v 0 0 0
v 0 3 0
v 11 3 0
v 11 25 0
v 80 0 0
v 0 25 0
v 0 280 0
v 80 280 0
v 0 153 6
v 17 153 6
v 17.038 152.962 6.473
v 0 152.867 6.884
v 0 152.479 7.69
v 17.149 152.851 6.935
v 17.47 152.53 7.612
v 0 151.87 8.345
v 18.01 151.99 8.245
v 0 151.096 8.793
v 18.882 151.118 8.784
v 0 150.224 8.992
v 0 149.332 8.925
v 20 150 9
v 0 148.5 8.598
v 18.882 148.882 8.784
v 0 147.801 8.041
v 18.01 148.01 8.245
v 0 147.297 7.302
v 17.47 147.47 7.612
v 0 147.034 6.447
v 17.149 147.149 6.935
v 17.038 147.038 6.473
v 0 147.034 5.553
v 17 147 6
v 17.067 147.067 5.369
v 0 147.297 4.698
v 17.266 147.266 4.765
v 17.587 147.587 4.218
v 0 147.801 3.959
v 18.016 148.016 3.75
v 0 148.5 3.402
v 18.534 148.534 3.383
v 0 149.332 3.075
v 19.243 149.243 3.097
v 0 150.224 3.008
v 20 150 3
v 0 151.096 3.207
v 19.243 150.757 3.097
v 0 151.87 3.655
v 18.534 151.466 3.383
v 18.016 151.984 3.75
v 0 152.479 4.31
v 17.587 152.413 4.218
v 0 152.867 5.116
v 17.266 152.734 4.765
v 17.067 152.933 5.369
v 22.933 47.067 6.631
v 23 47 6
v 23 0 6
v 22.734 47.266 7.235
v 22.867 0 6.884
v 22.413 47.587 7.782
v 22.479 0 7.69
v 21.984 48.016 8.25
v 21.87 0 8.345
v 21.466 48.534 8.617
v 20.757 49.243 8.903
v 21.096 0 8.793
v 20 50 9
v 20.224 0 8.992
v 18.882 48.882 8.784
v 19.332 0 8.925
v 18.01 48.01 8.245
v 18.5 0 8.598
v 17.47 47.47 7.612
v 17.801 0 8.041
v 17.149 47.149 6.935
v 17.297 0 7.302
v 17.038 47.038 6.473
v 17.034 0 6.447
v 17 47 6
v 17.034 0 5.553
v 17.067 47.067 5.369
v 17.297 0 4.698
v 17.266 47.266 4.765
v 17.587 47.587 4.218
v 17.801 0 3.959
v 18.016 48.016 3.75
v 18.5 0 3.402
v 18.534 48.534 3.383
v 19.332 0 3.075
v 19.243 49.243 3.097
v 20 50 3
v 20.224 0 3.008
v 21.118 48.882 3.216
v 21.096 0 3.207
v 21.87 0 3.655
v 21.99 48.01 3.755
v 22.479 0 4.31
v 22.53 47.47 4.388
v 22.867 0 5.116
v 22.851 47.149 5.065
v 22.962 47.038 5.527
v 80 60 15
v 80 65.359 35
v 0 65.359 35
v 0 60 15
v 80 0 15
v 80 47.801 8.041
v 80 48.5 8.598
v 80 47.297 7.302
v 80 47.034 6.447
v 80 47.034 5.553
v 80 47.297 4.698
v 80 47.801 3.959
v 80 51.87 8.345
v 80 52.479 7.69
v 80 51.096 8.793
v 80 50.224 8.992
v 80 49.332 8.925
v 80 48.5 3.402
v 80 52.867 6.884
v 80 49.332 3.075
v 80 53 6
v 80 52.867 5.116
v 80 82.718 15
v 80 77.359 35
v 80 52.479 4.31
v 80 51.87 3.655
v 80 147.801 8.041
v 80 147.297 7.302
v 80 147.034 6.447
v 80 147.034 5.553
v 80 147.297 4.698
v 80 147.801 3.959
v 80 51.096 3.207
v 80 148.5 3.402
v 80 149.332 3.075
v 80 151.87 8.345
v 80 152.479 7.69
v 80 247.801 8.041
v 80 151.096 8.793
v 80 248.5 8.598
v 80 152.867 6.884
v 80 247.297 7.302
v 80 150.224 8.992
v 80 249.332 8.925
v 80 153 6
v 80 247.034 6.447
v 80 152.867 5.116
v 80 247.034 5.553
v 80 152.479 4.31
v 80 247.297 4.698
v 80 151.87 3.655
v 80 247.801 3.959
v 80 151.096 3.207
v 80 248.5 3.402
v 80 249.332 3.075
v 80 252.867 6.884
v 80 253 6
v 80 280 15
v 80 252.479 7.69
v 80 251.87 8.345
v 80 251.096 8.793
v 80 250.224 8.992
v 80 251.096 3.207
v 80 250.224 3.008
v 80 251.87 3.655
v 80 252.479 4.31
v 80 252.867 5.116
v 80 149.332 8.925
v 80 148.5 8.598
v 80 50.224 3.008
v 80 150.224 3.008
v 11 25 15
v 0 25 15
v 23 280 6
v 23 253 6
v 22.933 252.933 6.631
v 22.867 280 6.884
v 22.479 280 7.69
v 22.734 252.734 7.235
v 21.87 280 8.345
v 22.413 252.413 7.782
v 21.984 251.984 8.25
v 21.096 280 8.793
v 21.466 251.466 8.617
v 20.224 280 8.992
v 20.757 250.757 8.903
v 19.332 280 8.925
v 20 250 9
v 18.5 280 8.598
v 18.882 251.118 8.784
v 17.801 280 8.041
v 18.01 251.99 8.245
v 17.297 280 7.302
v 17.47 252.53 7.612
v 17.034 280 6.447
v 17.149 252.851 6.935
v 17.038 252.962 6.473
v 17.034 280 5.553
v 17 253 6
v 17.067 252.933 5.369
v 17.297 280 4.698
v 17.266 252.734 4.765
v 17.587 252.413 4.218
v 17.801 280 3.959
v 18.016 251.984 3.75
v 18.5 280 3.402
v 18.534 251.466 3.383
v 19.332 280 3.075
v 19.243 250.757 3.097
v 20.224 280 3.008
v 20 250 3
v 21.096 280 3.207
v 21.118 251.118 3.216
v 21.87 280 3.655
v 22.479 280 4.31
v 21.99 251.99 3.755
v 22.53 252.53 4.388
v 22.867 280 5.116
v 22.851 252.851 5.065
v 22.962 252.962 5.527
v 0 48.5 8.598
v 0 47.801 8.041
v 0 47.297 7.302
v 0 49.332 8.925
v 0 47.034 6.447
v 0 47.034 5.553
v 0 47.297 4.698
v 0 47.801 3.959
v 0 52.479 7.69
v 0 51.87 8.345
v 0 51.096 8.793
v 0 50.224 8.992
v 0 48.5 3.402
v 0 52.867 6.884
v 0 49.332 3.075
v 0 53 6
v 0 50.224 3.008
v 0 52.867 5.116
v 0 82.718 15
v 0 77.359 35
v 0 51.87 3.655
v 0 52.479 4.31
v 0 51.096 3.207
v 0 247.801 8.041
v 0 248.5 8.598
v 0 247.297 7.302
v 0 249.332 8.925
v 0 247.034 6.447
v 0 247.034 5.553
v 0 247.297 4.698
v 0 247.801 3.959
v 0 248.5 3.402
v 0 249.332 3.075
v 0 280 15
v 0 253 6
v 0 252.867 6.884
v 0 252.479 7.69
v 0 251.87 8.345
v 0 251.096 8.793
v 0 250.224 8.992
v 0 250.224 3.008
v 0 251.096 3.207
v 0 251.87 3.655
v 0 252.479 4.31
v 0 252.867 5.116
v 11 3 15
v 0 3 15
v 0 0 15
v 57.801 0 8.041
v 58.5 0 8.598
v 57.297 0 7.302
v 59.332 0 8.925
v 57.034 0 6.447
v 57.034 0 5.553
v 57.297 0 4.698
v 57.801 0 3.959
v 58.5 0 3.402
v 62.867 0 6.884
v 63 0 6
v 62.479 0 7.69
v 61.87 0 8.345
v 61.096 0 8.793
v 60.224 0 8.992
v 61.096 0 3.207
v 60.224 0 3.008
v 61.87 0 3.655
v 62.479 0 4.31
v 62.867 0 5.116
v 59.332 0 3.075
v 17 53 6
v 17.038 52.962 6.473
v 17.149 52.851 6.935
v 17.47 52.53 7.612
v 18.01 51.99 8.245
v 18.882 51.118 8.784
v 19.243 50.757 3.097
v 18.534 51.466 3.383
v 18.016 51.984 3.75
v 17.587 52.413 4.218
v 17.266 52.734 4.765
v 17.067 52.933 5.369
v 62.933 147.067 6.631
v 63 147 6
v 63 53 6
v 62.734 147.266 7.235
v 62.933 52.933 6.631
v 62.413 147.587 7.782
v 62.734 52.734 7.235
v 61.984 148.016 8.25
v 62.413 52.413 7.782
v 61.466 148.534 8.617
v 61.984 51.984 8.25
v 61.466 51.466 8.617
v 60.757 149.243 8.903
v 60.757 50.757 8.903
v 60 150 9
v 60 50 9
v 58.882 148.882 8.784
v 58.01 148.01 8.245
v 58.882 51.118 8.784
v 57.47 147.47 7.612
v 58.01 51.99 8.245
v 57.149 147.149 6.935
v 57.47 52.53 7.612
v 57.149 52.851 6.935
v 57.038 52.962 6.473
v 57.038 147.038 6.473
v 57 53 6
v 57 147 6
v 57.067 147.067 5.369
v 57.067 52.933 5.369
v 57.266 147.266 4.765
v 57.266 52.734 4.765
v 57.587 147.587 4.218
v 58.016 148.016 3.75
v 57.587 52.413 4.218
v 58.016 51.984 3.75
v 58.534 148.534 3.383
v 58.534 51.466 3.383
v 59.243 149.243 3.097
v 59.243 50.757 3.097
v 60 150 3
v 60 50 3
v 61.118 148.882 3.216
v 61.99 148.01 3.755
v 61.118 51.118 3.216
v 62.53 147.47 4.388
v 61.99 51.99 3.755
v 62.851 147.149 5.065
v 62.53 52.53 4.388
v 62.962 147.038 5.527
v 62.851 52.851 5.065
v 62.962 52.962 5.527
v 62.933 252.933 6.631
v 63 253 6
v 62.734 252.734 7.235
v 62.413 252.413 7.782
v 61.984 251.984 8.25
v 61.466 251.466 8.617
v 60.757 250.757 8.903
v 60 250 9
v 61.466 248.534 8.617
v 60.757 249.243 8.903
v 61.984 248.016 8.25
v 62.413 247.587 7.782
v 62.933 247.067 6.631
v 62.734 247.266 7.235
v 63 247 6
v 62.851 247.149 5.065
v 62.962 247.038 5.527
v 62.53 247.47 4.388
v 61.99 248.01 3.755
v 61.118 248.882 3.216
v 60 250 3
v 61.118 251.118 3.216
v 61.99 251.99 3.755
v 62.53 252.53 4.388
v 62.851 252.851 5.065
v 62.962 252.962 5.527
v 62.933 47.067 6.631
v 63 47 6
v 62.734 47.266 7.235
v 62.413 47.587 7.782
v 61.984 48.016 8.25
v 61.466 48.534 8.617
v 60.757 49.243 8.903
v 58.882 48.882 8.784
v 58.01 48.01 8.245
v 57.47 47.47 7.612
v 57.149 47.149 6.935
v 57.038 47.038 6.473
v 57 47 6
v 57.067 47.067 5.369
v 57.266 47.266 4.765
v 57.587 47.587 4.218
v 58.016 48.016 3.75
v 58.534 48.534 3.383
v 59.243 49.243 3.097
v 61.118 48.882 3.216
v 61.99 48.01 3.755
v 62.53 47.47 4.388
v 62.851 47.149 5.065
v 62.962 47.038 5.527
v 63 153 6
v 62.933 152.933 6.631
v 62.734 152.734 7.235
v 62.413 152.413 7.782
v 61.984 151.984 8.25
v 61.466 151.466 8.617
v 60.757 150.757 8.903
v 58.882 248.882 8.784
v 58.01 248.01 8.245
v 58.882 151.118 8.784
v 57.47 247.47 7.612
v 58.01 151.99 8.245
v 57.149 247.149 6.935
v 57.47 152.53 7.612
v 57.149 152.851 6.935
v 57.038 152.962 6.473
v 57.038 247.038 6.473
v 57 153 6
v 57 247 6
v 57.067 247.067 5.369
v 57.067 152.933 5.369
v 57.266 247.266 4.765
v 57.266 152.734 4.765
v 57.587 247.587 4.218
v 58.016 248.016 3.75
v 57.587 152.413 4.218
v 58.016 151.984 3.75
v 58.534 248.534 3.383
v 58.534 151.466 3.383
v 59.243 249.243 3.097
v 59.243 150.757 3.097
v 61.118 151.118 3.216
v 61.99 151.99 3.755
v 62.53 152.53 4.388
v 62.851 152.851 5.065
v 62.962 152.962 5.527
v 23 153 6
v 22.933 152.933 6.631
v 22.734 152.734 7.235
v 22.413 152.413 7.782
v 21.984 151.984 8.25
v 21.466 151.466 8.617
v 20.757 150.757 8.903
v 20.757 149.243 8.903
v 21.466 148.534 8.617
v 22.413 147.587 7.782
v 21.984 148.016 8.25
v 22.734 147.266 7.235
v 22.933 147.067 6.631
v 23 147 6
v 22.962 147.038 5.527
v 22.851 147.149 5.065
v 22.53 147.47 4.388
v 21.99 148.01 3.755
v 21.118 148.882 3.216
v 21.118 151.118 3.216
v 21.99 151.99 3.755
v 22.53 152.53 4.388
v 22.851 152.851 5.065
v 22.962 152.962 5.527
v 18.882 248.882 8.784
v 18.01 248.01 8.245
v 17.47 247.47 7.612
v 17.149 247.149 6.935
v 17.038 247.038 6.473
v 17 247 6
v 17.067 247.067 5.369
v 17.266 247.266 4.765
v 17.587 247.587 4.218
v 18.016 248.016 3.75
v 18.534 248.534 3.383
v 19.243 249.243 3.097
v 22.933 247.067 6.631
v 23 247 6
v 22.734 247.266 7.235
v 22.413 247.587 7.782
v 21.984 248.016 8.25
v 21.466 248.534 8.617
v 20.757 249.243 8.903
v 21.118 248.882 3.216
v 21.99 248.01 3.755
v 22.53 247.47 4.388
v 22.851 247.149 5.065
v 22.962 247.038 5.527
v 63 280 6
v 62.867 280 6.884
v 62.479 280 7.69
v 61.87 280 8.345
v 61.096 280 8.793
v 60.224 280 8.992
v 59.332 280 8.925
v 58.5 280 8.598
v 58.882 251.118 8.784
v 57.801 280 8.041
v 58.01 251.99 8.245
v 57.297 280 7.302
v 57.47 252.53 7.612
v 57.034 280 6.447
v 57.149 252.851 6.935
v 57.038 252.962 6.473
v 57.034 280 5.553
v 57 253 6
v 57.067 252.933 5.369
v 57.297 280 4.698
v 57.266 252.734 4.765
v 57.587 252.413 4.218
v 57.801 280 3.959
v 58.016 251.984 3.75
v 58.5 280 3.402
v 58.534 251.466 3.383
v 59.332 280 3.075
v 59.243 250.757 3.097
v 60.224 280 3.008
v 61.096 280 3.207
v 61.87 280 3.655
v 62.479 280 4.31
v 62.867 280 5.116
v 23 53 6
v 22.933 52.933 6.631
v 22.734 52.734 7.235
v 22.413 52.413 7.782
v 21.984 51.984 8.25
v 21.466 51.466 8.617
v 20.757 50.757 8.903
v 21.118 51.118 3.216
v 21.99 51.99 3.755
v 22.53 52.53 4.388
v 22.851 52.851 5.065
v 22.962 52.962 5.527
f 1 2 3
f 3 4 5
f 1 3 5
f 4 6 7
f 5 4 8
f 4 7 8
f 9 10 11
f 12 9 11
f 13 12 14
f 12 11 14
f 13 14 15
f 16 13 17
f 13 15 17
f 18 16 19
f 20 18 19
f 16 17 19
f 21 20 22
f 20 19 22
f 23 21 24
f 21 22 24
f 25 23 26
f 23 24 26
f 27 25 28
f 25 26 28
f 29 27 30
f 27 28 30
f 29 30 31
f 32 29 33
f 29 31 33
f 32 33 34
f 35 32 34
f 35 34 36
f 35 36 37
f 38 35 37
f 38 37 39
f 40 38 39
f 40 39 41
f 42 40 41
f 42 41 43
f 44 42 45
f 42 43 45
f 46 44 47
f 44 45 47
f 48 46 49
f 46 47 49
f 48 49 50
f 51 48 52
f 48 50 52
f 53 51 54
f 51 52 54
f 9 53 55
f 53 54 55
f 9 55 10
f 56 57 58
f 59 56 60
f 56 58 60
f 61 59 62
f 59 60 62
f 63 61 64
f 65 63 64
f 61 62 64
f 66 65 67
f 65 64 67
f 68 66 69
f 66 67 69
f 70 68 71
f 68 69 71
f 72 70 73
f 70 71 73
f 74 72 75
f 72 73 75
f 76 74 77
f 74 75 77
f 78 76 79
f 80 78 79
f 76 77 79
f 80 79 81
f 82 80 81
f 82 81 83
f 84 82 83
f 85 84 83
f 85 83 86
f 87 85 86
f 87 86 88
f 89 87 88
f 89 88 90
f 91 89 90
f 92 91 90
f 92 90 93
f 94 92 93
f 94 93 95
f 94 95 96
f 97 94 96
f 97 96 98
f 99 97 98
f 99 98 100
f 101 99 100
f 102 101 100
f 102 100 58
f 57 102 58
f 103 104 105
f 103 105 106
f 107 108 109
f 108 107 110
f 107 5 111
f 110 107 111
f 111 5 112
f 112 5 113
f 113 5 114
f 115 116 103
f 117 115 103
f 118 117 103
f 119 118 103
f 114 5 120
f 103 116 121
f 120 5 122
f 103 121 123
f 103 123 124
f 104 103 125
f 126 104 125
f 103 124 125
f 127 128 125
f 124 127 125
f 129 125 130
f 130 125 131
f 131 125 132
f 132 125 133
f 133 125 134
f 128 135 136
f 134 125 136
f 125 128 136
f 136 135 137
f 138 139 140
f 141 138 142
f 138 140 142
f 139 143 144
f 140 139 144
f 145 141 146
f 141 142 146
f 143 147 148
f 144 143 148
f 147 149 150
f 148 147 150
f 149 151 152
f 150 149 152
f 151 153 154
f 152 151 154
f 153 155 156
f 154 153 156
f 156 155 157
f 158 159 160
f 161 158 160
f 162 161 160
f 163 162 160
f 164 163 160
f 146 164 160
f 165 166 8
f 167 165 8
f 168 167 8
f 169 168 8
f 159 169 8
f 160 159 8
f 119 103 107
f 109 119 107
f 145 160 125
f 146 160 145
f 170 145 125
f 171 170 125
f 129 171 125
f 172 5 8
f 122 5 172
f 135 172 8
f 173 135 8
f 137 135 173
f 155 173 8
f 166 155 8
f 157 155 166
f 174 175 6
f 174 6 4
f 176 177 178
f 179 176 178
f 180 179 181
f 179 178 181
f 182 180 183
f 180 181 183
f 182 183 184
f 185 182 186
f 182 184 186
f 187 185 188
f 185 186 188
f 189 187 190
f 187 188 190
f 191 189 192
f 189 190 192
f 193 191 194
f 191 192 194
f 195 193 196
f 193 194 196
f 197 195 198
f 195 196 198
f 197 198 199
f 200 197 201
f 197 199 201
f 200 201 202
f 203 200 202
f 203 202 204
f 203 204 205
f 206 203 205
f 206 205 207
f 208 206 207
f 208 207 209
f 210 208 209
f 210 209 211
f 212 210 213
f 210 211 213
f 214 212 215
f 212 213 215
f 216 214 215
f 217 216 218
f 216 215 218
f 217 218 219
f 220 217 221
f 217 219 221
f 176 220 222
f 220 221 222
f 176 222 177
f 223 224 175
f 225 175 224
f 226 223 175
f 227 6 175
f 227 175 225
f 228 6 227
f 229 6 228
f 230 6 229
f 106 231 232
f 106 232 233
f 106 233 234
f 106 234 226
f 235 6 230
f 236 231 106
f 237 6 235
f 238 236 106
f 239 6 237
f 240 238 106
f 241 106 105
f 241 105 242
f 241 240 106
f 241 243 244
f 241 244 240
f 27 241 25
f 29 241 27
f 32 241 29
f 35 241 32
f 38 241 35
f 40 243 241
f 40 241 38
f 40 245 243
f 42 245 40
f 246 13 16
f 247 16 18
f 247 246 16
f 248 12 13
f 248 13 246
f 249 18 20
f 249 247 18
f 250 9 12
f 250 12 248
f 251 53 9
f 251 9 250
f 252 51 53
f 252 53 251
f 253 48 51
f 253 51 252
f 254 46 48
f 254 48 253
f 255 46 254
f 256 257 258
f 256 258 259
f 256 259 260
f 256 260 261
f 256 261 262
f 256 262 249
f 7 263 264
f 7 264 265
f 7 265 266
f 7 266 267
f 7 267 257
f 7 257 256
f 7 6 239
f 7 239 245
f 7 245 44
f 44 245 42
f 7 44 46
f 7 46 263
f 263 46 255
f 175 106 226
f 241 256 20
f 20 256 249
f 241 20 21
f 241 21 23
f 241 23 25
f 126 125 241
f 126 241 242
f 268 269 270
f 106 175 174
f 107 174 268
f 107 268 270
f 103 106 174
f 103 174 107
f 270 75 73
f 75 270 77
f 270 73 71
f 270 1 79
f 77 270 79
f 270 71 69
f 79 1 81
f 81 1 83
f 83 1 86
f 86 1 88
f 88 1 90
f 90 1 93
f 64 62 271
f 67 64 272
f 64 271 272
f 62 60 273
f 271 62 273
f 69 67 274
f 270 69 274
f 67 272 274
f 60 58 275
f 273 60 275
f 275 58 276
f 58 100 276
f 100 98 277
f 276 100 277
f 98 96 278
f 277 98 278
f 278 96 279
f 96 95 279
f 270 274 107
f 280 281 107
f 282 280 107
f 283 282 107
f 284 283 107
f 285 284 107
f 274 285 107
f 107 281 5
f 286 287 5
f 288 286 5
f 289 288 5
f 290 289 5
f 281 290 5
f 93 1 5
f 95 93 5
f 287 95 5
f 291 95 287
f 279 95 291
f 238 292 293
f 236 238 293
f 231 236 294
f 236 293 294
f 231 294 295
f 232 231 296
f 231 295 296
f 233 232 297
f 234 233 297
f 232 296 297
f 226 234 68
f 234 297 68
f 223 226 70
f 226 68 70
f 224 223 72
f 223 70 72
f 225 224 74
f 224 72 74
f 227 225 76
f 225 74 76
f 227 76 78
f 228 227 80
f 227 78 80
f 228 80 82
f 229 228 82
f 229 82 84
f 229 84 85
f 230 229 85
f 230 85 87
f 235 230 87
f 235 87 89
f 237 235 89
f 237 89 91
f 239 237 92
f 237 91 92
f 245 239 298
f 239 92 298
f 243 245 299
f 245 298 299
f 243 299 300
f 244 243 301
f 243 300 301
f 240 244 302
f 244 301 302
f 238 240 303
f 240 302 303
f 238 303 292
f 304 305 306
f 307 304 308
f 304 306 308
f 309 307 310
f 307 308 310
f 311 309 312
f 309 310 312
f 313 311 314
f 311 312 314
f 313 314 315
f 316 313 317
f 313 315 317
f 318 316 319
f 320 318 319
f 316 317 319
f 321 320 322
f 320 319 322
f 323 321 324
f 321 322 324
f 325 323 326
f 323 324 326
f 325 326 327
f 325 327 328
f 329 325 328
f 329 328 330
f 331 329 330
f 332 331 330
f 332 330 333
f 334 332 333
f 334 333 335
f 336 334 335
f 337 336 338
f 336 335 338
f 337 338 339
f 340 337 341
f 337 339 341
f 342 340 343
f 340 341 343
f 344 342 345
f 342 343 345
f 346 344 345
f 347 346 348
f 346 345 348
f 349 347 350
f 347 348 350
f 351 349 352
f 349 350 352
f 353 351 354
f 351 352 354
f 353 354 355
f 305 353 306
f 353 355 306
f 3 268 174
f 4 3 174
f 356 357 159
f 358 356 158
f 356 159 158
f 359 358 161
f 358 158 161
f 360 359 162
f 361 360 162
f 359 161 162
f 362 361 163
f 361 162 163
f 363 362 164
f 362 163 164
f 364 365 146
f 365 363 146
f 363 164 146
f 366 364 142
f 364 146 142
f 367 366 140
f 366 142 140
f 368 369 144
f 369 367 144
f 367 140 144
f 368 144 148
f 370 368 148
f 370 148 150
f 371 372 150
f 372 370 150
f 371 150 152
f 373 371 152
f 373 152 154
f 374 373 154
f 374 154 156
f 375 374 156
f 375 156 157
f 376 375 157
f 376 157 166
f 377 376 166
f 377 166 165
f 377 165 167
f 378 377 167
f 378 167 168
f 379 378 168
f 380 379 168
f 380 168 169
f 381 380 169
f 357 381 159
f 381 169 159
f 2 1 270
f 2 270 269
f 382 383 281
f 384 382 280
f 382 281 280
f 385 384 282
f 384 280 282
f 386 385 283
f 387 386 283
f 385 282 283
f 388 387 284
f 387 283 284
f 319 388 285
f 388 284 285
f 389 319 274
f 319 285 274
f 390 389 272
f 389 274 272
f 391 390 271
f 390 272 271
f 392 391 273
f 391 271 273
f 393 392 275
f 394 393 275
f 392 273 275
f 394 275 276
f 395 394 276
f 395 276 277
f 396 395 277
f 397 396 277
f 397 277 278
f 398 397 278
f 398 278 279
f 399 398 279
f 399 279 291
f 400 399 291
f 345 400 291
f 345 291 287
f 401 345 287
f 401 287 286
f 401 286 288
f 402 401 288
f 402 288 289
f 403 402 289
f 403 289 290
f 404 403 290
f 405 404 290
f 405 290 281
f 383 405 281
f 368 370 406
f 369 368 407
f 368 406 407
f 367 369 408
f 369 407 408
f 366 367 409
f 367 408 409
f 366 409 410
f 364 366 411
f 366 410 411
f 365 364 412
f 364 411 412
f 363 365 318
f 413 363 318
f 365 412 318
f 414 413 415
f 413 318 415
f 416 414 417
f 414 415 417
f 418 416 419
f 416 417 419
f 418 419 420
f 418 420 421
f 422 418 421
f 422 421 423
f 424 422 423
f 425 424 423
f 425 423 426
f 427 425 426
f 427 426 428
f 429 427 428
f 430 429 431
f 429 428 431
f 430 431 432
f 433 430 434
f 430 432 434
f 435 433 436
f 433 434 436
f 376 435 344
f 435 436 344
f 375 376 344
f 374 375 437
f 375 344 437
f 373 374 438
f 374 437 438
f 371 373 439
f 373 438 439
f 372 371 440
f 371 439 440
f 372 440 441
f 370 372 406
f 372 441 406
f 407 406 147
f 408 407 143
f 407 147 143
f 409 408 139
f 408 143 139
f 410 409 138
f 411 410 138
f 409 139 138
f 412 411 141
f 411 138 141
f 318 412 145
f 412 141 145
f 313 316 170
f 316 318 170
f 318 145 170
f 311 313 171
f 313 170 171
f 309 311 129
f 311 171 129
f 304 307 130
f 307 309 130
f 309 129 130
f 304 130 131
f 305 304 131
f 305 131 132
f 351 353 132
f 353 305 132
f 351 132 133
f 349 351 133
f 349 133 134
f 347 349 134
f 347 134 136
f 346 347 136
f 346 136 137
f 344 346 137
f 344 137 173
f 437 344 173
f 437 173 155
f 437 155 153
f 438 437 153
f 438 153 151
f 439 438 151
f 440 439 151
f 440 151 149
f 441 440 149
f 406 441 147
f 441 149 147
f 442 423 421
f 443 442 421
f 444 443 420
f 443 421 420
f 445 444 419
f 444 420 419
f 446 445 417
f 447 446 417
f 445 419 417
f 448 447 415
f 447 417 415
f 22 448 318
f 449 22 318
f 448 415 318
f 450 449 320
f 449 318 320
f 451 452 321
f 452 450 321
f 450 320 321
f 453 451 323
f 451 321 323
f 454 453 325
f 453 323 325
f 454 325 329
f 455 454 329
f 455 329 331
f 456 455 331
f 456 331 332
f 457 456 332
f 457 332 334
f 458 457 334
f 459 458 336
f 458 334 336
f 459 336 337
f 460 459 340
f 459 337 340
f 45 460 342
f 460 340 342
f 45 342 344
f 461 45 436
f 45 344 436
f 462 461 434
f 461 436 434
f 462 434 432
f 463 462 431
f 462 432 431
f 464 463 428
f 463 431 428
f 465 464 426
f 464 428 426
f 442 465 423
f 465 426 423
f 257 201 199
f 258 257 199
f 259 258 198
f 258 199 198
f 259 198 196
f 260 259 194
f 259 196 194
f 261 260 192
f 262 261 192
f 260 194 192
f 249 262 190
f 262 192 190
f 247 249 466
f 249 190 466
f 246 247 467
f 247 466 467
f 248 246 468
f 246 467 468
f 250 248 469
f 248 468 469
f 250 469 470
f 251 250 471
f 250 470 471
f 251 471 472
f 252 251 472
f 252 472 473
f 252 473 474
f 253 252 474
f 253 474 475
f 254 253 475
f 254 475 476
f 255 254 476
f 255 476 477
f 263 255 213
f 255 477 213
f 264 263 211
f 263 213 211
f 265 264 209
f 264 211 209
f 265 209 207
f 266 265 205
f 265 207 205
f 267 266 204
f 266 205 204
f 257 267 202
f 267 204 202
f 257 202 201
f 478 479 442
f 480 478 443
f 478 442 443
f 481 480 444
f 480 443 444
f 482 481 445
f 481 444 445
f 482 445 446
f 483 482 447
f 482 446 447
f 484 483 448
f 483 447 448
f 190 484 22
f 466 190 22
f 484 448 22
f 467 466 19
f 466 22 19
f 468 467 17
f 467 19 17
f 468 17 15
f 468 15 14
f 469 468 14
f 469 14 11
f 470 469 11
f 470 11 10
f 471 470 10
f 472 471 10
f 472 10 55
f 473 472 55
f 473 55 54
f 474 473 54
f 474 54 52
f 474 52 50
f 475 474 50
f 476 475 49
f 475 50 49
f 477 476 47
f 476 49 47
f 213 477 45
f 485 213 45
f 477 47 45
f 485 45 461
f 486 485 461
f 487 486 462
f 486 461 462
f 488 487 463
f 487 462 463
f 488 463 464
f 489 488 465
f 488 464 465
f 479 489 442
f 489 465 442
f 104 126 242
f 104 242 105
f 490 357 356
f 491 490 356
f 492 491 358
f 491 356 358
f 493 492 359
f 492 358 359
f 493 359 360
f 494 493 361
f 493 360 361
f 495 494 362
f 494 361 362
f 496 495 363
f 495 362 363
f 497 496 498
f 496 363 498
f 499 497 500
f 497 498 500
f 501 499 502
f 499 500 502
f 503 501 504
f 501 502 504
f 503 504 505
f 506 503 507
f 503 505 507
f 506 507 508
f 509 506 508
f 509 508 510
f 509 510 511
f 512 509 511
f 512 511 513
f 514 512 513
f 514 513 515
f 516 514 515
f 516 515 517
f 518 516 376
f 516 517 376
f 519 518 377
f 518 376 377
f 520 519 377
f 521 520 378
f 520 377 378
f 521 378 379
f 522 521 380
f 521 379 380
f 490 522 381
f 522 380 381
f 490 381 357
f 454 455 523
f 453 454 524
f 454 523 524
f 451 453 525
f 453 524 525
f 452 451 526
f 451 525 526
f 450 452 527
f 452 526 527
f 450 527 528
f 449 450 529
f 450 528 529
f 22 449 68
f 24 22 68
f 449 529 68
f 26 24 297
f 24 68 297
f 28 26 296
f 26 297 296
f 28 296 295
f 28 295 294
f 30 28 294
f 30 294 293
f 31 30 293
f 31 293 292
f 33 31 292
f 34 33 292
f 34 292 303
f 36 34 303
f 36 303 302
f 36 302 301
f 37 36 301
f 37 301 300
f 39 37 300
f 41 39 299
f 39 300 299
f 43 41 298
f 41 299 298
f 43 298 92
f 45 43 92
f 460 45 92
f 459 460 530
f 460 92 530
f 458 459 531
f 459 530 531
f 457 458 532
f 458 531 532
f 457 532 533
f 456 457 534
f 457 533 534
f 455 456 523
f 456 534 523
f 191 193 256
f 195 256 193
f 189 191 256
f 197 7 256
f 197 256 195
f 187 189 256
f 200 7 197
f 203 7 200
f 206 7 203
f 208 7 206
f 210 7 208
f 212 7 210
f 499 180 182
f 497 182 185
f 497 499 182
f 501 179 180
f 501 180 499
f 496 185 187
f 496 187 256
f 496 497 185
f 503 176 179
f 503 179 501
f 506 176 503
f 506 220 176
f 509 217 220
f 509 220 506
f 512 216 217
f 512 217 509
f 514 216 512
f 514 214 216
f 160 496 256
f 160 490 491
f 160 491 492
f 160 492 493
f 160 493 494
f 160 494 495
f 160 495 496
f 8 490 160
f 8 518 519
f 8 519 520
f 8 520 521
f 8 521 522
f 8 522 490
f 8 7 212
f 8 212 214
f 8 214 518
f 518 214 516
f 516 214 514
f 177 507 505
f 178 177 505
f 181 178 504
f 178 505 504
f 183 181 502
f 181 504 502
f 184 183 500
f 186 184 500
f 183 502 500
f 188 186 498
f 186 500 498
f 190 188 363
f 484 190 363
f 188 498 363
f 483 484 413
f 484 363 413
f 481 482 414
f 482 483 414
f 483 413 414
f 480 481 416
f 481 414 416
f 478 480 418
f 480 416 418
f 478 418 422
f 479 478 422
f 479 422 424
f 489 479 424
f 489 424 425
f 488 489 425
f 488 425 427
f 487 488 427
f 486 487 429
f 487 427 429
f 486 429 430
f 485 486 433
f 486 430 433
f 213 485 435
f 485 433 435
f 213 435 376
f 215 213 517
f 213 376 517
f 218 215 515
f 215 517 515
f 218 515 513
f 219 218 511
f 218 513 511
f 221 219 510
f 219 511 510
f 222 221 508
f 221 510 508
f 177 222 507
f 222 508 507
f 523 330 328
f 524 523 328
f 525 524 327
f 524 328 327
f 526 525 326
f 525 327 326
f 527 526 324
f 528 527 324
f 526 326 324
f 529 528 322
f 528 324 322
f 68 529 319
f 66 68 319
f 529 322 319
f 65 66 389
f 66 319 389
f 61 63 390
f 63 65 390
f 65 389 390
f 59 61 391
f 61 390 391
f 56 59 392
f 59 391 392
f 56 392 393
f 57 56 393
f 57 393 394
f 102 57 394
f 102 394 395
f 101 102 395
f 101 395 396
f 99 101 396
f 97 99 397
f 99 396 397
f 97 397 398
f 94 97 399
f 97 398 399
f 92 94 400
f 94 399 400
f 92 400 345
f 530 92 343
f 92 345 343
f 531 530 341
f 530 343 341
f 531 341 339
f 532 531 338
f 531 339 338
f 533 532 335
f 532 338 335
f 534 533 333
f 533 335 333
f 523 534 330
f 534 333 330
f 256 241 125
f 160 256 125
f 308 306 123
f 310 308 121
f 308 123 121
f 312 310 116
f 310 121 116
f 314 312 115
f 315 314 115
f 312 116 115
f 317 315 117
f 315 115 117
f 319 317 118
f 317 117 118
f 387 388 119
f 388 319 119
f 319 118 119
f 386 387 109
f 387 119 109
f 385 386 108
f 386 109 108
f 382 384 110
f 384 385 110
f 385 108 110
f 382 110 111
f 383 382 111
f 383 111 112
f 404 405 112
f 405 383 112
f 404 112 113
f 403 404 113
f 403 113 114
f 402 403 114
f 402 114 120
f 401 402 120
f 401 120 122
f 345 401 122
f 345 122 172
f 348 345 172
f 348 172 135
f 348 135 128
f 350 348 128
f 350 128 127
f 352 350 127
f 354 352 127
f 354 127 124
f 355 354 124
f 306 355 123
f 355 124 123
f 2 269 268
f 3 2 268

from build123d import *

# Parameters (mm, degrees)
F0_W      = 80
F0_H      = 280
F1_DEPTH  = 15
F3_DEPTH  = 80
F4_W      = 11
F4_H      = 22
F5_DEPTH  = 15
F7_R      = 3
F7_R_2    = 6.556779
F8_DEPTH  = 280.001
F9_R      = 3
F10_DEPTH = 80.001


with BuildPart() as f1:
    # F0 (on Top) → F1 (new body)
    with BuildSketch(Plane.XY):
        with Locations((40, 140)):
            Rectangle(F0_W, F0_H)
    extrude(amount=F1_DEPTH)

    # F2 (on face) → F3 (join)
    with BuildSketch(Plane.YZ.offset(80)):
        Polygon((65.358984, 35), (60, 15), (82.717968, 15), (77.358984, 35), align=None)
    extrude(amount=-F3_DEPTH)

    # F4 (on face) → F5 (cut, through all)
    with BuildSketch(Plane.XY.offset(15)):
        with Locations((5.5, 14)):
            Rectangle(F4_W, F4_H)
    extrude(amount=-F5_DEPTH, mode=Mode.SUBTRACT)

    # F7 (on face) → F8 (cut, through all)
    with BuildSketch(Plane.XZ):
        with Locations((60, 6)):
            Circle(F7_R)
        with Locations((-491.183044, 5.330358)):
            Circle(F7_R_2)
        with Locations((20, 6)):
            Circle(F7_R)
    extrude(amount=-F8_DEPTH, mode=Mode.SUBTRACT)

    # F9 (on face) → F10 (cut, through all)
    with BuildSketch(Plane.YZ.offset(80)):
        with Locations((50, 6)):
            Circle(F9_R)
        with Locations((150, 6)):
            Circle(F9_R)
        with Locations((250, 6)):
            Circle(F9_R)
    extrude(amount=-F10_DEPTH, mode=Mode.SUBTRACT)


solid = f1.part
